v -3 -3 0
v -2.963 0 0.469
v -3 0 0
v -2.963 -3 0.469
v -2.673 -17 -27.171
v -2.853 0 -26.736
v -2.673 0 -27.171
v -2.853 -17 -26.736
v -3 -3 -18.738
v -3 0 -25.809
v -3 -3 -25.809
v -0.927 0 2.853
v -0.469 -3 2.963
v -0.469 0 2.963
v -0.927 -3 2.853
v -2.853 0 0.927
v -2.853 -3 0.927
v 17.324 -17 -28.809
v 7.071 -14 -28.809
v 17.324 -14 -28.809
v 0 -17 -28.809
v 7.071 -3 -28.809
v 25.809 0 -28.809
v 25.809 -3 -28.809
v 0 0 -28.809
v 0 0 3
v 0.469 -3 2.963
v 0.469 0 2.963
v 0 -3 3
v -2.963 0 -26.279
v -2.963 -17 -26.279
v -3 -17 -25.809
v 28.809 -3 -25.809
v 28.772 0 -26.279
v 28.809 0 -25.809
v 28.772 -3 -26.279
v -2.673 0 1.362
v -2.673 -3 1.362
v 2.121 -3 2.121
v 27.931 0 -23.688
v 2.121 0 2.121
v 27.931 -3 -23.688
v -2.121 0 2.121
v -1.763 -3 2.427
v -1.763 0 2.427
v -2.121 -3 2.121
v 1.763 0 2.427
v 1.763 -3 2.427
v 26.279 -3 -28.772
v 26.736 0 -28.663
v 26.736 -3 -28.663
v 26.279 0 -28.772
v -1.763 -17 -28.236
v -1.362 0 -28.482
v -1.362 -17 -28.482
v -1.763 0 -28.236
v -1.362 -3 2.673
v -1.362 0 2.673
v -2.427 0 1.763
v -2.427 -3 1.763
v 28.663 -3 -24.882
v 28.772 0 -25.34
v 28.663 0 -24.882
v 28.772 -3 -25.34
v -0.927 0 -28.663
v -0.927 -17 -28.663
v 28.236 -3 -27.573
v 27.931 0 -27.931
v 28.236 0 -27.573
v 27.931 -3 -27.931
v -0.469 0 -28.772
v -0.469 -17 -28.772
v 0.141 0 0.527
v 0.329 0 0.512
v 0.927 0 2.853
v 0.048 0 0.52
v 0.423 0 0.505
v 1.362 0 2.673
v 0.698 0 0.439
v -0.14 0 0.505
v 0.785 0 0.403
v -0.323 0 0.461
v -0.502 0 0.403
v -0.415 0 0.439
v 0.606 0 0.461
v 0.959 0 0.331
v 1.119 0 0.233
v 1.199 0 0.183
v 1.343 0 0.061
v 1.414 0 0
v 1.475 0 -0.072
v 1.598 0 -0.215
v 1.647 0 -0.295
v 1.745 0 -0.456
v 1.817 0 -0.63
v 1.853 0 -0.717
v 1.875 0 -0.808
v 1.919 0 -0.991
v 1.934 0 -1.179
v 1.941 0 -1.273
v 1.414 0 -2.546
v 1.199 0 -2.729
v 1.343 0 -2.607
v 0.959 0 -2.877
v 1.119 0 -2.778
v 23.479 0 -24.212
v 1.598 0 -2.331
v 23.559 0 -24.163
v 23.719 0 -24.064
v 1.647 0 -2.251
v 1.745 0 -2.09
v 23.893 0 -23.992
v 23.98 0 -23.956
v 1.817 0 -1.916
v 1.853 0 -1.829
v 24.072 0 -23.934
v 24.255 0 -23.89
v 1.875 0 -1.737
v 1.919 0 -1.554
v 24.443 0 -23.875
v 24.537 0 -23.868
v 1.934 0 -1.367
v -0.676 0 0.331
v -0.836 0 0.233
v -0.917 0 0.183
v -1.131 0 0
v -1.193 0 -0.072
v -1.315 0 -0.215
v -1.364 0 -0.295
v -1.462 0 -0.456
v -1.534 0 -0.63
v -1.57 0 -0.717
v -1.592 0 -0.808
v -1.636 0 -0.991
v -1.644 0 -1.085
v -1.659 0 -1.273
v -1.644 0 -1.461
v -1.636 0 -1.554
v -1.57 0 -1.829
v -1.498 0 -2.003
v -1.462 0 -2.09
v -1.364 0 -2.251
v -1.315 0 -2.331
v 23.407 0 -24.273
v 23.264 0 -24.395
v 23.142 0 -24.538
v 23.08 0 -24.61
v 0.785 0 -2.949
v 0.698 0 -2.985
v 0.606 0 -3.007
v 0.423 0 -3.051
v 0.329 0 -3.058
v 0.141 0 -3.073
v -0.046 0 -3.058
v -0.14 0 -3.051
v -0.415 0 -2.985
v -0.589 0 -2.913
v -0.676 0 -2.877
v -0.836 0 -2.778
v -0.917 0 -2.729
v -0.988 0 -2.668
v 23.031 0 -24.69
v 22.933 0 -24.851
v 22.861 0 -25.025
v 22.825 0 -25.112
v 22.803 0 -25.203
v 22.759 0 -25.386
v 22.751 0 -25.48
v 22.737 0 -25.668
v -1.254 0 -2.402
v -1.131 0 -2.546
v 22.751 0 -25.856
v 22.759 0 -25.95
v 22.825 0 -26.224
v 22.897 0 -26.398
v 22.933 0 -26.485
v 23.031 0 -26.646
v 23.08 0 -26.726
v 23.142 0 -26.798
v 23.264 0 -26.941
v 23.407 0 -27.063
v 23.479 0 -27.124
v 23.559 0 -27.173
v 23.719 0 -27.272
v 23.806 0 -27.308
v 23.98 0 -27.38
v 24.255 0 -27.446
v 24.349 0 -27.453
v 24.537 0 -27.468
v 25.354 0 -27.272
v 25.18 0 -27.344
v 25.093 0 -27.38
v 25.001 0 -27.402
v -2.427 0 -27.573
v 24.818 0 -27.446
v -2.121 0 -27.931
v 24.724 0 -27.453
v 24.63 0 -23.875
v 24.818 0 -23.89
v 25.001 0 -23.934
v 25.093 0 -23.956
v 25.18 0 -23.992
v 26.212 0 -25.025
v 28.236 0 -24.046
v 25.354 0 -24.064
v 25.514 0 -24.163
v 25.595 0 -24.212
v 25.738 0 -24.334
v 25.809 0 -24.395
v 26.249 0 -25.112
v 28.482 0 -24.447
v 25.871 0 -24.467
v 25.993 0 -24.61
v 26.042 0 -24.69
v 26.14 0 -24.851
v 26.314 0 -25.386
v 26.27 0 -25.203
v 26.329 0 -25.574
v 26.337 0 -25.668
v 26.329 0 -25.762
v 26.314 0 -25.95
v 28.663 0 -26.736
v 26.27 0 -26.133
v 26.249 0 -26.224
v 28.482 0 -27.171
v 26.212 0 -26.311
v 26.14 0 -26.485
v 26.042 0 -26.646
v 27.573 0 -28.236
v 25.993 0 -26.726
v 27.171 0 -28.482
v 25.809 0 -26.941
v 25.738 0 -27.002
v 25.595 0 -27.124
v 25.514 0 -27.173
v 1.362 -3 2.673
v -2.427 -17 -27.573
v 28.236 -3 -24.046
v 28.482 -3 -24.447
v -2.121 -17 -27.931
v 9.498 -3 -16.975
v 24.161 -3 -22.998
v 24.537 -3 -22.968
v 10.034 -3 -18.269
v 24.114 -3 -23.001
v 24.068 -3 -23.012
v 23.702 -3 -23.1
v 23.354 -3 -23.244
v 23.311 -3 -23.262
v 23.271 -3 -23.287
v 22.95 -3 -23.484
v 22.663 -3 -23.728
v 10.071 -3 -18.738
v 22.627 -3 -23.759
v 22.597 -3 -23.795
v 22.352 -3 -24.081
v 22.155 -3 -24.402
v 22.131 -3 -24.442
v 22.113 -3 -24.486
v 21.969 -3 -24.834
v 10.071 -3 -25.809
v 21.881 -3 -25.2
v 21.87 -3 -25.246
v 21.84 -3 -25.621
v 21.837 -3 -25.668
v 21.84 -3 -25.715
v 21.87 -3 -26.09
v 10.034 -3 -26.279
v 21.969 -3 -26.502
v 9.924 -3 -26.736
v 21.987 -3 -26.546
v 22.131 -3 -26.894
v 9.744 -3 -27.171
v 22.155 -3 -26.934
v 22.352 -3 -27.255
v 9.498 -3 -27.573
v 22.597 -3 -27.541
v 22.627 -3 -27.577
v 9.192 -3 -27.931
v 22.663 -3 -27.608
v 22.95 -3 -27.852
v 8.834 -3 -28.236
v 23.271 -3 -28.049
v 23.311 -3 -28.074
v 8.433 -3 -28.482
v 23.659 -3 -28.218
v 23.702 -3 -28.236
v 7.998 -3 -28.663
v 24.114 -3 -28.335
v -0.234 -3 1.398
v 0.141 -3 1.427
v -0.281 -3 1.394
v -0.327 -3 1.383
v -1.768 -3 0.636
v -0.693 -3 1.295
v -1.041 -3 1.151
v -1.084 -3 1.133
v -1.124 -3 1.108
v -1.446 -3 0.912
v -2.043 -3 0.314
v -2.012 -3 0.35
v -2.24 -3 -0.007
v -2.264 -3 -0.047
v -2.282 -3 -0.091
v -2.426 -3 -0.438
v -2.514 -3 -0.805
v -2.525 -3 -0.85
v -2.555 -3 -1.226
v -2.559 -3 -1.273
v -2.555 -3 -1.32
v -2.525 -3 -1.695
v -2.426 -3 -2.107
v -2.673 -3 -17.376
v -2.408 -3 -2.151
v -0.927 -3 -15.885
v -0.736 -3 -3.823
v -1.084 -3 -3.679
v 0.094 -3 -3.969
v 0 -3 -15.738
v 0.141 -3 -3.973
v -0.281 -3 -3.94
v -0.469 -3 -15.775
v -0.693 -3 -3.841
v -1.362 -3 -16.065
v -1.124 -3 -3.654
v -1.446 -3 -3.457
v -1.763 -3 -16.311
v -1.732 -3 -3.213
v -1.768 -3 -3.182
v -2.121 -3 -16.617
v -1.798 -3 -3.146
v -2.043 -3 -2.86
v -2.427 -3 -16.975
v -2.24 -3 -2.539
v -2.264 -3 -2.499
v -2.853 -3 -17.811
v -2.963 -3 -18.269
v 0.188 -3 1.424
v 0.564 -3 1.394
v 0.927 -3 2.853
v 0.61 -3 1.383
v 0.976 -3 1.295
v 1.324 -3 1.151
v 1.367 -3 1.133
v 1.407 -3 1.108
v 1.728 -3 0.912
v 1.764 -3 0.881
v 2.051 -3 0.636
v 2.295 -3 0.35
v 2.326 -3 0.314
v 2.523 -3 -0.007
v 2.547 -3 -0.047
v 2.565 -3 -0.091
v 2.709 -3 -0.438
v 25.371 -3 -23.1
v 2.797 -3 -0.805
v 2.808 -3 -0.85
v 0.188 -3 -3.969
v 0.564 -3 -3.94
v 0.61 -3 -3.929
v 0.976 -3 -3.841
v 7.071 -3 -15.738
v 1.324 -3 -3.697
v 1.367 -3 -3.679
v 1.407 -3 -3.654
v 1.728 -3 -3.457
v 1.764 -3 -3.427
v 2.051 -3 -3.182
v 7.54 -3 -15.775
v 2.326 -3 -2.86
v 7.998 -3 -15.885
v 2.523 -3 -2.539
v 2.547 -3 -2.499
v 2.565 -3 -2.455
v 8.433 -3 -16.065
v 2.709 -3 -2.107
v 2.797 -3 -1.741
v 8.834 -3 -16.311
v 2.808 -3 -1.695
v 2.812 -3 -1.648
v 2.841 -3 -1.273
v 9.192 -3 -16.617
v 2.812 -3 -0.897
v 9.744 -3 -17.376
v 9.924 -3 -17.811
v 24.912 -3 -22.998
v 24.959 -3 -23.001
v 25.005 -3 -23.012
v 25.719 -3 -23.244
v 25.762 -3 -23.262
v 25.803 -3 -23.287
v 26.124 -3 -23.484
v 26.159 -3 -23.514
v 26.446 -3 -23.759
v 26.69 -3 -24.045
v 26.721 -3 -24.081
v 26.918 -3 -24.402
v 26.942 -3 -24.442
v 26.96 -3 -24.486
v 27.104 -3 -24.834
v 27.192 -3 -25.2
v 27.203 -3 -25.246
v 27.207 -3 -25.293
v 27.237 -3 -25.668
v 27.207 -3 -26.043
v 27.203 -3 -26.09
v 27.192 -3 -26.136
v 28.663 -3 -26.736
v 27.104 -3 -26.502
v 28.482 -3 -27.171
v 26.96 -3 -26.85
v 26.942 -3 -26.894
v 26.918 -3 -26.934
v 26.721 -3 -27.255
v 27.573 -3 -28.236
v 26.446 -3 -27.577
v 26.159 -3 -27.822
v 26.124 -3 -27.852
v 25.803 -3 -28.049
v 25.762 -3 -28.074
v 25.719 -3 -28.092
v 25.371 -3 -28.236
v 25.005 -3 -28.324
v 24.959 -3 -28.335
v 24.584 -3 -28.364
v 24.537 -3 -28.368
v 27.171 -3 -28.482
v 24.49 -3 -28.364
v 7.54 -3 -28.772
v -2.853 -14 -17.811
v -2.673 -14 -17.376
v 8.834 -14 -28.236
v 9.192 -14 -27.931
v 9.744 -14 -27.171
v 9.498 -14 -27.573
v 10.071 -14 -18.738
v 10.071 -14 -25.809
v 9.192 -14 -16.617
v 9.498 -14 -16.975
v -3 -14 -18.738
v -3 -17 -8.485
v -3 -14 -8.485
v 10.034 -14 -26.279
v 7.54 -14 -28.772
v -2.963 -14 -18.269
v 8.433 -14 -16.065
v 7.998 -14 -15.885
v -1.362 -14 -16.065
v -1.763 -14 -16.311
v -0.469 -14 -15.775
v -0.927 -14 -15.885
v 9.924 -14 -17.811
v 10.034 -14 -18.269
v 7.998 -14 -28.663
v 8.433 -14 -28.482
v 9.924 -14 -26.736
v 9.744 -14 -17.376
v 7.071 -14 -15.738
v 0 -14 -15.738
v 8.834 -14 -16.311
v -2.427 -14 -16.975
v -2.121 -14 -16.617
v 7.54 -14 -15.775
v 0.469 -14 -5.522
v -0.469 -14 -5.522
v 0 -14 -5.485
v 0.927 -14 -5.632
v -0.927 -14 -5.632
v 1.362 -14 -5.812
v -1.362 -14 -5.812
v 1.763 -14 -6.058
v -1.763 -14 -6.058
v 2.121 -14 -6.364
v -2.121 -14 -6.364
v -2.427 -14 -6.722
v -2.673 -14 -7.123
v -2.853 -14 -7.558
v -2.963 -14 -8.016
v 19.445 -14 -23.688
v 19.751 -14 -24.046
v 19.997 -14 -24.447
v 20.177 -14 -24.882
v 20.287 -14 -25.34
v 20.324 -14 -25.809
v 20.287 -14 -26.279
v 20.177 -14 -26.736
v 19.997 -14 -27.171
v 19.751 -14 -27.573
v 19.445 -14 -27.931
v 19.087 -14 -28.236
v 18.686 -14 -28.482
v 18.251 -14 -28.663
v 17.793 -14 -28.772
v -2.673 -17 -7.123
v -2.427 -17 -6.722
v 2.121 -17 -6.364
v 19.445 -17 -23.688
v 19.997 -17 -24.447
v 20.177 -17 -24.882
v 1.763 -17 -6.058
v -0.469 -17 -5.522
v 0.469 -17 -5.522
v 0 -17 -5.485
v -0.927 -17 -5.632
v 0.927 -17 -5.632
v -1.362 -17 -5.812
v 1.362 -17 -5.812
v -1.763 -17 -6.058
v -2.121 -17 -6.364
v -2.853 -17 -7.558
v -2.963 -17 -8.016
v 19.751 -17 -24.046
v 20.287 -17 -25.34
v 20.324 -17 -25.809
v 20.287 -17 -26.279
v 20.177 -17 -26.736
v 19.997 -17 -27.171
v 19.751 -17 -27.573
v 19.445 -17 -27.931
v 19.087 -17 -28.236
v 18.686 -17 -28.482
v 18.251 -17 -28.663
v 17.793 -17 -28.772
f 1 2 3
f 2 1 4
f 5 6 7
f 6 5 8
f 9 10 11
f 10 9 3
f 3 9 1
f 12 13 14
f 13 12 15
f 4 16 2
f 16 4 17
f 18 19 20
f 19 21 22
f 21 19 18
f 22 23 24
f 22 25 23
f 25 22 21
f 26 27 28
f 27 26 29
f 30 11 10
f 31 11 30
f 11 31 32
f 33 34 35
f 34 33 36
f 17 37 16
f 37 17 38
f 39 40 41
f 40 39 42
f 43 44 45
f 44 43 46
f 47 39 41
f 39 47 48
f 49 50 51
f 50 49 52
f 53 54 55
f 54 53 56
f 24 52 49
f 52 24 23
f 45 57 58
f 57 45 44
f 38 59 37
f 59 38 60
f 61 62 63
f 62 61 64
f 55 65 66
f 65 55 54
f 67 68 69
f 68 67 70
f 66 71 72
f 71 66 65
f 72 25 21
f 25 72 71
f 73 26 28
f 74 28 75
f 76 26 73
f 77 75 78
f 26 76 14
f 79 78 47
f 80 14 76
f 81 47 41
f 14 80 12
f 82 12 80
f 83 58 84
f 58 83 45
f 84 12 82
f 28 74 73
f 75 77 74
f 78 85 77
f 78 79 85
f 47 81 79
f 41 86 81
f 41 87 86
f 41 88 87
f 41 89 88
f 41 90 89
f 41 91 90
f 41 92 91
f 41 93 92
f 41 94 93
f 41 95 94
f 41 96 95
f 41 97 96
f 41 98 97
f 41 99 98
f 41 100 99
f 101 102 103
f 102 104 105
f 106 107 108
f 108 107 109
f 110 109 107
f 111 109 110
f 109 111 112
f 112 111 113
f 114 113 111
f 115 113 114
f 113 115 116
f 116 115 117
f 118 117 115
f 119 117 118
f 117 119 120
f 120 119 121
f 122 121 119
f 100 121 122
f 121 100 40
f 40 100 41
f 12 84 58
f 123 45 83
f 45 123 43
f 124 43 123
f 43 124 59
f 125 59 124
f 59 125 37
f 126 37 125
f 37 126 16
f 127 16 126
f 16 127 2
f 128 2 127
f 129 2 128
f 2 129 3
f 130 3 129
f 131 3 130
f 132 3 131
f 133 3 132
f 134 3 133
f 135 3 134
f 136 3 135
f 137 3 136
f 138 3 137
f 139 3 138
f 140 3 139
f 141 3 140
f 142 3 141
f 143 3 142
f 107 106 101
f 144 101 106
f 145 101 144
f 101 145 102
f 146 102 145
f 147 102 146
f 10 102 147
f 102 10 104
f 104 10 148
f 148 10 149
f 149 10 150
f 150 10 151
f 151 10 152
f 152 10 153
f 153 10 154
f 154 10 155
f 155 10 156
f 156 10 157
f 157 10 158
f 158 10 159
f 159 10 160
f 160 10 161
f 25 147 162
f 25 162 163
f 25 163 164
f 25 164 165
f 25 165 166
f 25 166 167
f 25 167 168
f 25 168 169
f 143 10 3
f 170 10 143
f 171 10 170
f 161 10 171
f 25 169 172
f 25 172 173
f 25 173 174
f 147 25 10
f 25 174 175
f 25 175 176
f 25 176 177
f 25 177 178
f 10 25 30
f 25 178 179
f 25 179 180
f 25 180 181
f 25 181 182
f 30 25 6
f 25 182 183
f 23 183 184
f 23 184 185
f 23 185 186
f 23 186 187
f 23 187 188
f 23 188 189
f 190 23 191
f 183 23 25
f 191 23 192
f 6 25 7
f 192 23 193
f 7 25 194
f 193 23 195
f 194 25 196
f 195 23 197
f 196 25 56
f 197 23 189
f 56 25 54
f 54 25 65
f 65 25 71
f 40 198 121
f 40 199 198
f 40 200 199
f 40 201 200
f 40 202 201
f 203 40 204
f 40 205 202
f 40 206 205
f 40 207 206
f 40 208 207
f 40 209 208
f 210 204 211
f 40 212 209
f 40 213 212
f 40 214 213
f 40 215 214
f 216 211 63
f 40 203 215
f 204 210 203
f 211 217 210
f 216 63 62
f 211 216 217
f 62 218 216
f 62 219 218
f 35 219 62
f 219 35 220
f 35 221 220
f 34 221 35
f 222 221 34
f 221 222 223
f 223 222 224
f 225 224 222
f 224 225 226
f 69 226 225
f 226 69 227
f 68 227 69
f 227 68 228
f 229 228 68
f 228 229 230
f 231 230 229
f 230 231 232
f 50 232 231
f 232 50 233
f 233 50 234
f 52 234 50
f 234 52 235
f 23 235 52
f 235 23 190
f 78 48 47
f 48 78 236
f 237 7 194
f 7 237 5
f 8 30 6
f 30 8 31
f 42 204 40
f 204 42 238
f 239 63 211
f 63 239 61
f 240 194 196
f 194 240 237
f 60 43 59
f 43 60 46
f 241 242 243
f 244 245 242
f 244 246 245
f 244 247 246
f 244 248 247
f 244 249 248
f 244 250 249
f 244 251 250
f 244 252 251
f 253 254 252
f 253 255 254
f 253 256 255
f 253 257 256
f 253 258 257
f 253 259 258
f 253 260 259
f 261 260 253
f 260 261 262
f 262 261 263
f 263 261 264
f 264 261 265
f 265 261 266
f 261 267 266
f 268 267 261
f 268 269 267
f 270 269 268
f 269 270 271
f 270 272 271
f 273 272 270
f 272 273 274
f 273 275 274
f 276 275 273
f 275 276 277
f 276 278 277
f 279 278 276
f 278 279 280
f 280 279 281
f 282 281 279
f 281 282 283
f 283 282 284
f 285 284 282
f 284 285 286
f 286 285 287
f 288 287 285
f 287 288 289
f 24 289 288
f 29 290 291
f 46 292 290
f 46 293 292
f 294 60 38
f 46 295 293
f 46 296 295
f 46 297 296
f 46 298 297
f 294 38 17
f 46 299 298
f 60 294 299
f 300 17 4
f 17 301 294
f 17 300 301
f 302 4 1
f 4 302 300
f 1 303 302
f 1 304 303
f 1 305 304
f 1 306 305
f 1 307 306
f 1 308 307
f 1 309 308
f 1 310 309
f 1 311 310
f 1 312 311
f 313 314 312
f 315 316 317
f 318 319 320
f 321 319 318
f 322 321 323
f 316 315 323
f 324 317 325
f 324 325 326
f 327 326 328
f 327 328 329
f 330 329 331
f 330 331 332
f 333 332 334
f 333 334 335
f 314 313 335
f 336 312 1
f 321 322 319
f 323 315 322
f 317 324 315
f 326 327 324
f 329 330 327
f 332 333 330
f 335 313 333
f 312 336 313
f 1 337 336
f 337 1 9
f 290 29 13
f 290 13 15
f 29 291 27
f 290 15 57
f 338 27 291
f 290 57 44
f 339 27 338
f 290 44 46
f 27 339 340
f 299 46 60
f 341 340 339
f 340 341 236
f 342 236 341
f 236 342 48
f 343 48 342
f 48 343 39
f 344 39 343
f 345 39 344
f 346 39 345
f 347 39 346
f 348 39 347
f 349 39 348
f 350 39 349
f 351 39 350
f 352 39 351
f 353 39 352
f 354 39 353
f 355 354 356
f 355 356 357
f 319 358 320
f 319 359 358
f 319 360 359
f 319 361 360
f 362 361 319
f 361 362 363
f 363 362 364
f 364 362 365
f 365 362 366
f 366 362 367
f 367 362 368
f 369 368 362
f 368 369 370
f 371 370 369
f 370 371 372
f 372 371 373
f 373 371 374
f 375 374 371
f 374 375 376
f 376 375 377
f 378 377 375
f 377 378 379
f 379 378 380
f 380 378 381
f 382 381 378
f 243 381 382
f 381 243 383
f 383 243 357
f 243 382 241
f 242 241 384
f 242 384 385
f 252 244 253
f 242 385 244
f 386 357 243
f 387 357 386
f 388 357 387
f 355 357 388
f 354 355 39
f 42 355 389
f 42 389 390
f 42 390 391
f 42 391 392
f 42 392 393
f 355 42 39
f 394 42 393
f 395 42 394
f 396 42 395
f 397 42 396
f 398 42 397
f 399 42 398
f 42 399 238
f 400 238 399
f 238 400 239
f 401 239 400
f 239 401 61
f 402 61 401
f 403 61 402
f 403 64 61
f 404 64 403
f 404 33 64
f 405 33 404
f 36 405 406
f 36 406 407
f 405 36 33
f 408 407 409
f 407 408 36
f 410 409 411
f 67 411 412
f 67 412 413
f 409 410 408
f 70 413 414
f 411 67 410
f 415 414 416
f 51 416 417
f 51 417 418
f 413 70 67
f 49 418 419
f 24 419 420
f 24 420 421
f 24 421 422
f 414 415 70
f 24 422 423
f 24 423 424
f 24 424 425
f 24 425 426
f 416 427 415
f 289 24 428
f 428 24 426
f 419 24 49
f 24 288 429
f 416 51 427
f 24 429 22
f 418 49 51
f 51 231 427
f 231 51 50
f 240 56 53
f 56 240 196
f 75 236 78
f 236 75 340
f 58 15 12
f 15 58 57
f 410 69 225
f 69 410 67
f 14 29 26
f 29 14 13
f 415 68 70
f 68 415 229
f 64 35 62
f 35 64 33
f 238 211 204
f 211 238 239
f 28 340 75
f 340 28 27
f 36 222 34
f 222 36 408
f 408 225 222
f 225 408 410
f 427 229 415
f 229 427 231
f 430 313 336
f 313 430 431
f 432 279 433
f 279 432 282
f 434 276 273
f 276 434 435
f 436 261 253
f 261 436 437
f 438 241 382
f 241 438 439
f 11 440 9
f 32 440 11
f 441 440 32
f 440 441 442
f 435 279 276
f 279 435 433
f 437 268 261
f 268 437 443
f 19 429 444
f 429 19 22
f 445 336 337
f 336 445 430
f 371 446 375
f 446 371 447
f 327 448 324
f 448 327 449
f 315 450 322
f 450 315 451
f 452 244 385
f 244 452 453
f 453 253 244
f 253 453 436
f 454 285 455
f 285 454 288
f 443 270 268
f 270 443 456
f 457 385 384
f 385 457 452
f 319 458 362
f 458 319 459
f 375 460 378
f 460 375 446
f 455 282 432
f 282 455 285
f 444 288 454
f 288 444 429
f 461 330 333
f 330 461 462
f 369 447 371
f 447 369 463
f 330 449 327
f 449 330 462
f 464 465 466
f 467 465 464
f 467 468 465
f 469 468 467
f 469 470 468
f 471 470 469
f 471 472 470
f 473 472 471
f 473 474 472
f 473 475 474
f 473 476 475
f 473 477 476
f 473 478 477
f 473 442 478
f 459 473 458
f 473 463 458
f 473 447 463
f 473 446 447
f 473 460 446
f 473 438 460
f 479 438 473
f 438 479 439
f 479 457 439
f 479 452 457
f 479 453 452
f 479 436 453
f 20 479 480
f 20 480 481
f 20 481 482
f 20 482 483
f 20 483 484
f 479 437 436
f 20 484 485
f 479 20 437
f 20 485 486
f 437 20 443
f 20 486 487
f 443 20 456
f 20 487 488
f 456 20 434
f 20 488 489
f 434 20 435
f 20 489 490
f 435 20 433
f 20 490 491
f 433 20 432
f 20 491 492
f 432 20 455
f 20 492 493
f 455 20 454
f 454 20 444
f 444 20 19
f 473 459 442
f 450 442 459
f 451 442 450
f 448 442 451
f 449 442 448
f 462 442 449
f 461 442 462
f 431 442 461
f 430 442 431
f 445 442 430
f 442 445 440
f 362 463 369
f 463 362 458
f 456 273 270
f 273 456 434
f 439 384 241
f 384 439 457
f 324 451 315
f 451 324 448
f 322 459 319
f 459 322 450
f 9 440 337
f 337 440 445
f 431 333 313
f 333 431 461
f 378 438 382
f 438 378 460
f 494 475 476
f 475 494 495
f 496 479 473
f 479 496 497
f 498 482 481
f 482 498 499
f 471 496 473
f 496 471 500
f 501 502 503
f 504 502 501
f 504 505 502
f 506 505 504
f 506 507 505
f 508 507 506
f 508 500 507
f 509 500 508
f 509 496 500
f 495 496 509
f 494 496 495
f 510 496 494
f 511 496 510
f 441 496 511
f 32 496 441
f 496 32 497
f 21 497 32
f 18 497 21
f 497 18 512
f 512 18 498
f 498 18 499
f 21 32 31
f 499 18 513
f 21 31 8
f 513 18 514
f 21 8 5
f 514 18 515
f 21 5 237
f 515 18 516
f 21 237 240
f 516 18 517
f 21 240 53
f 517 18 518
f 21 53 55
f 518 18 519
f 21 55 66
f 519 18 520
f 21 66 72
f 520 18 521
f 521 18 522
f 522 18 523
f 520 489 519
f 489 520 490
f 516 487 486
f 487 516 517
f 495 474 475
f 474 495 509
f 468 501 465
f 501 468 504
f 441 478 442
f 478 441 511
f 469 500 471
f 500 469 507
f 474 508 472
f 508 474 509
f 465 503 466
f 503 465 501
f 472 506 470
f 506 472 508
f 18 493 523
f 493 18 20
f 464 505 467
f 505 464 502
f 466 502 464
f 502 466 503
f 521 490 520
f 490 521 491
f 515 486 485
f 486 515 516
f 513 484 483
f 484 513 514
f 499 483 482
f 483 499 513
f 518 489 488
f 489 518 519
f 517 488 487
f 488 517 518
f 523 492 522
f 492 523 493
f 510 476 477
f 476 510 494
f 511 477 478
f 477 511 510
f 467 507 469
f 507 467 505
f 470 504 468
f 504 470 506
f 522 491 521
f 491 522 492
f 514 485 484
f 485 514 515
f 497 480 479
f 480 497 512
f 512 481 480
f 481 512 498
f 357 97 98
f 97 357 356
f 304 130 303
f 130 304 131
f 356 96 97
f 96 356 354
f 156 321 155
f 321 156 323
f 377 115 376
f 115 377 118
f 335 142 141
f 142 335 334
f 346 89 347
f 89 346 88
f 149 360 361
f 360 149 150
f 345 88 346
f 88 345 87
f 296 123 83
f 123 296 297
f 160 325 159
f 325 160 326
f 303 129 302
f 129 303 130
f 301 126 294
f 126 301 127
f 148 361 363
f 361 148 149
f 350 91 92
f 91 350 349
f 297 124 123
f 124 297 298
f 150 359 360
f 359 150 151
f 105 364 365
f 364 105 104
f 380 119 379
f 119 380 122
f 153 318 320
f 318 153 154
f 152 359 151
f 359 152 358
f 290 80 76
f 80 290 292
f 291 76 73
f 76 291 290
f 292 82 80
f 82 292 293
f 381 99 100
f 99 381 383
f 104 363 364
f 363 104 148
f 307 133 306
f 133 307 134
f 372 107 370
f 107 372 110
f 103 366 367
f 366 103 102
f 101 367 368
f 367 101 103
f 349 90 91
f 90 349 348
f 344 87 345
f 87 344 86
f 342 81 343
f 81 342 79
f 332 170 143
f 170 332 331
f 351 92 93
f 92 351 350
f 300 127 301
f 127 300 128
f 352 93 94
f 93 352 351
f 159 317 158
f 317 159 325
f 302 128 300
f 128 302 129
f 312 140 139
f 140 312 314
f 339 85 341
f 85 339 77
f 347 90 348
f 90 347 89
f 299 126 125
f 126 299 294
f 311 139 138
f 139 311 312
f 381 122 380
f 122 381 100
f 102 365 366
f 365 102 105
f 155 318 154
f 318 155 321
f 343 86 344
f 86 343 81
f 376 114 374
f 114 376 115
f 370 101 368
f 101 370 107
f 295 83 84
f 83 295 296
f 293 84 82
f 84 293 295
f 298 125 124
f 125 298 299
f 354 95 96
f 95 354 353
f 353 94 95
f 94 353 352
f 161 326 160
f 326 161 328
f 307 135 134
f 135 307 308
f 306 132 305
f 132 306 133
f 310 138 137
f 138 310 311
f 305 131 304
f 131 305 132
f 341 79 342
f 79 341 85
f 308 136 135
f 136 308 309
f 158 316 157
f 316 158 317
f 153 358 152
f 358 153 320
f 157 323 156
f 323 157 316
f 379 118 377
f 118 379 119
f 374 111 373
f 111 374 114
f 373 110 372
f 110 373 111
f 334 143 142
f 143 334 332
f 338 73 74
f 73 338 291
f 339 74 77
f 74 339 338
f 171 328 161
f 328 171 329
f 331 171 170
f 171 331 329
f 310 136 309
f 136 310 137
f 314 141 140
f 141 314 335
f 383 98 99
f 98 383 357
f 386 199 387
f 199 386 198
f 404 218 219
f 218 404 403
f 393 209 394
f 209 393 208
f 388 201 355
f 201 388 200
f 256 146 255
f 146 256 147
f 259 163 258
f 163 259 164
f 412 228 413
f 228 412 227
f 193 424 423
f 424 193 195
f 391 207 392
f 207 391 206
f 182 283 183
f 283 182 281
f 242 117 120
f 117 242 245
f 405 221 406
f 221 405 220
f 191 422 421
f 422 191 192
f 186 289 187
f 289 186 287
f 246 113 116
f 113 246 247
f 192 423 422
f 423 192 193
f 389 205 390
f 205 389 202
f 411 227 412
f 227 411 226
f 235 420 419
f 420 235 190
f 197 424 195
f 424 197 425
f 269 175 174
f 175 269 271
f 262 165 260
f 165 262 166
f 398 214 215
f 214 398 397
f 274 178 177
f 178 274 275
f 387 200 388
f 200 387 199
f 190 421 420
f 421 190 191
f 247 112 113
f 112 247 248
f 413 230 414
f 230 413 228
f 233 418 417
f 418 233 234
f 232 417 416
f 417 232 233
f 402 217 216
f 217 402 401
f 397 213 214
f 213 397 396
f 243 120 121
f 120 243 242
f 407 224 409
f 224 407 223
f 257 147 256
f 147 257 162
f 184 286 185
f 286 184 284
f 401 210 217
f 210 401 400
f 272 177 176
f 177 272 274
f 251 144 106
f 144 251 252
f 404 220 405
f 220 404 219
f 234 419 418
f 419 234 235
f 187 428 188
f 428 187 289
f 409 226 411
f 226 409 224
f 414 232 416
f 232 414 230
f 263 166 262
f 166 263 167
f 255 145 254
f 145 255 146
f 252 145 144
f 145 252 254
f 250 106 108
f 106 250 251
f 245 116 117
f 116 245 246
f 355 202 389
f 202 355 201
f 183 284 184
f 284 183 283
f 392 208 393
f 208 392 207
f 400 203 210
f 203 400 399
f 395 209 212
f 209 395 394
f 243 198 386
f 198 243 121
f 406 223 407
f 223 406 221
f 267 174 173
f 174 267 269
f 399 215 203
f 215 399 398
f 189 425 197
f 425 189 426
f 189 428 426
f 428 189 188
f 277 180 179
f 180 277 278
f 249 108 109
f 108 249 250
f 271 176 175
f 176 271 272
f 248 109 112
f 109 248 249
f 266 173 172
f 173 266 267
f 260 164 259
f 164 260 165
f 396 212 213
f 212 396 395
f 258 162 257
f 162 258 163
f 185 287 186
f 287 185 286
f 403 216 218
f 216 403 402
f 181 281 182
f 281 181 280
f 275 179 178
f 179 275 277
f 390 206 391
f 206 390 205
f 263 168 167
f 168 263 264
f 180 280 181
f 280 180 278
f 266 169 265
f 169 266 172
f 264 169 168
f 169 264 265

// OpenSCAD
screw_holes = 3;//[2:20]
tool_handle_thickness=11;//[5:100]
tool_handle_inside_gape=10;//[3:50]
thickness=3;//[2:10]
/* [Hidden] */
$fn=40; 


rotate([90,45,0]){
difference() {
union() {
hull(){
translate([0,0,0])cylinder(h=thickness,r=screw_holes);
translate([(tool_handle_thickness*2)+(screw_holes*1.5)+tool_handle_inside_gape,0,0])cylinder(h=thickness,r=screw_holes);
translate([((tool_handle_thickness*2)+(screw_holes*1.5)+tool_handle_inside_gape)/2,-((tool_handle_thickness*2)+(screw_holes*1.5)+tool_handle_inside_gape)/2,0])cylinder(h=thickness,r=screw_holes);
}


hull(){
translate([((tool_handle_thickness*2)+(screw_holes*1.5)+tool_handle_inside_gape)/2,-((tool_handle_thickness*2)+(screw_holes*1.5)+tool_handle_inside_gape)/2,thickness])cylinder(h=tool_handle_thickness,r=screw_holes);

translate([((tool_handle_thickness*2)+(screw_holes*1.5)+tool_handle_inside_gape)/2-tool_handle_inside_gape/2,-((tool_handle_thickness*2)+(screw_holes*1.5)+tool_handle_inside_gape)/2+tool_handle_inside_gape/2,thickness])cylinder(h=tool_handle_thickness,r=screw_holes);

translate([((tool_handle_thickness*2)+(screw_holes*1.5)+tool_handle_inside_gape)/2+tool_handle_inside_gape/2,-((tool_handle_thickness*2)+(screw_holes*1.5)+tool_handle_inside_gape)/2+tool_handle_inside_gape/2,thickness])cylinder(h=tool_handle_thickness,r=screw_holes);

translate([((tool_handle_thickness*2)+(screw_holes*1.5)+tool_handle_inside_gape)/2,-((tool_handle_thickness*2)+(screw_holes*1.5)+tool_handle_inside_gape)/2+tool_handle_inside_gape,thickness])cylinder(h=tool_handle_thickness,r=screw_holes);

}

hull(){
translate([screw_holes*2,-screw_holes*2,tool_handle_thickness+thickness])cylinder(h=thickness,r=screw_holes);
translate([(tool_handle_thickness*2)+(screw_holes*1.5)+tool_handle_inside_gape-screw_holes*2,-screw_holes*2,tool_handle_thickness+thickness])cylinder(h=thickness,r=screw_holes);
translate([((tool_handle_thickness*2)+(screw_holes*1.5)+tool_handle_inside_gape)/2,-((tool_handle_thickness*2)+(screw_holes*1.5)+tool_handle_inside_gape)/2,tool_handle_thickness+thickness])cylinder(h=thickness,r=screw_holes);
}
}
translate([1,-.8,-1])cylinder(h=thickness+2,r1=screw_holes/2,r2=screw_holes);
translate([(tool_handle_thickness*2)+(screw_holes*1.5)+tool_handle_inside_gape-1,-.8,-1])cylinder(h=thickness+2,r1=screw_holes/2,r2=screw_holes);
}
}
